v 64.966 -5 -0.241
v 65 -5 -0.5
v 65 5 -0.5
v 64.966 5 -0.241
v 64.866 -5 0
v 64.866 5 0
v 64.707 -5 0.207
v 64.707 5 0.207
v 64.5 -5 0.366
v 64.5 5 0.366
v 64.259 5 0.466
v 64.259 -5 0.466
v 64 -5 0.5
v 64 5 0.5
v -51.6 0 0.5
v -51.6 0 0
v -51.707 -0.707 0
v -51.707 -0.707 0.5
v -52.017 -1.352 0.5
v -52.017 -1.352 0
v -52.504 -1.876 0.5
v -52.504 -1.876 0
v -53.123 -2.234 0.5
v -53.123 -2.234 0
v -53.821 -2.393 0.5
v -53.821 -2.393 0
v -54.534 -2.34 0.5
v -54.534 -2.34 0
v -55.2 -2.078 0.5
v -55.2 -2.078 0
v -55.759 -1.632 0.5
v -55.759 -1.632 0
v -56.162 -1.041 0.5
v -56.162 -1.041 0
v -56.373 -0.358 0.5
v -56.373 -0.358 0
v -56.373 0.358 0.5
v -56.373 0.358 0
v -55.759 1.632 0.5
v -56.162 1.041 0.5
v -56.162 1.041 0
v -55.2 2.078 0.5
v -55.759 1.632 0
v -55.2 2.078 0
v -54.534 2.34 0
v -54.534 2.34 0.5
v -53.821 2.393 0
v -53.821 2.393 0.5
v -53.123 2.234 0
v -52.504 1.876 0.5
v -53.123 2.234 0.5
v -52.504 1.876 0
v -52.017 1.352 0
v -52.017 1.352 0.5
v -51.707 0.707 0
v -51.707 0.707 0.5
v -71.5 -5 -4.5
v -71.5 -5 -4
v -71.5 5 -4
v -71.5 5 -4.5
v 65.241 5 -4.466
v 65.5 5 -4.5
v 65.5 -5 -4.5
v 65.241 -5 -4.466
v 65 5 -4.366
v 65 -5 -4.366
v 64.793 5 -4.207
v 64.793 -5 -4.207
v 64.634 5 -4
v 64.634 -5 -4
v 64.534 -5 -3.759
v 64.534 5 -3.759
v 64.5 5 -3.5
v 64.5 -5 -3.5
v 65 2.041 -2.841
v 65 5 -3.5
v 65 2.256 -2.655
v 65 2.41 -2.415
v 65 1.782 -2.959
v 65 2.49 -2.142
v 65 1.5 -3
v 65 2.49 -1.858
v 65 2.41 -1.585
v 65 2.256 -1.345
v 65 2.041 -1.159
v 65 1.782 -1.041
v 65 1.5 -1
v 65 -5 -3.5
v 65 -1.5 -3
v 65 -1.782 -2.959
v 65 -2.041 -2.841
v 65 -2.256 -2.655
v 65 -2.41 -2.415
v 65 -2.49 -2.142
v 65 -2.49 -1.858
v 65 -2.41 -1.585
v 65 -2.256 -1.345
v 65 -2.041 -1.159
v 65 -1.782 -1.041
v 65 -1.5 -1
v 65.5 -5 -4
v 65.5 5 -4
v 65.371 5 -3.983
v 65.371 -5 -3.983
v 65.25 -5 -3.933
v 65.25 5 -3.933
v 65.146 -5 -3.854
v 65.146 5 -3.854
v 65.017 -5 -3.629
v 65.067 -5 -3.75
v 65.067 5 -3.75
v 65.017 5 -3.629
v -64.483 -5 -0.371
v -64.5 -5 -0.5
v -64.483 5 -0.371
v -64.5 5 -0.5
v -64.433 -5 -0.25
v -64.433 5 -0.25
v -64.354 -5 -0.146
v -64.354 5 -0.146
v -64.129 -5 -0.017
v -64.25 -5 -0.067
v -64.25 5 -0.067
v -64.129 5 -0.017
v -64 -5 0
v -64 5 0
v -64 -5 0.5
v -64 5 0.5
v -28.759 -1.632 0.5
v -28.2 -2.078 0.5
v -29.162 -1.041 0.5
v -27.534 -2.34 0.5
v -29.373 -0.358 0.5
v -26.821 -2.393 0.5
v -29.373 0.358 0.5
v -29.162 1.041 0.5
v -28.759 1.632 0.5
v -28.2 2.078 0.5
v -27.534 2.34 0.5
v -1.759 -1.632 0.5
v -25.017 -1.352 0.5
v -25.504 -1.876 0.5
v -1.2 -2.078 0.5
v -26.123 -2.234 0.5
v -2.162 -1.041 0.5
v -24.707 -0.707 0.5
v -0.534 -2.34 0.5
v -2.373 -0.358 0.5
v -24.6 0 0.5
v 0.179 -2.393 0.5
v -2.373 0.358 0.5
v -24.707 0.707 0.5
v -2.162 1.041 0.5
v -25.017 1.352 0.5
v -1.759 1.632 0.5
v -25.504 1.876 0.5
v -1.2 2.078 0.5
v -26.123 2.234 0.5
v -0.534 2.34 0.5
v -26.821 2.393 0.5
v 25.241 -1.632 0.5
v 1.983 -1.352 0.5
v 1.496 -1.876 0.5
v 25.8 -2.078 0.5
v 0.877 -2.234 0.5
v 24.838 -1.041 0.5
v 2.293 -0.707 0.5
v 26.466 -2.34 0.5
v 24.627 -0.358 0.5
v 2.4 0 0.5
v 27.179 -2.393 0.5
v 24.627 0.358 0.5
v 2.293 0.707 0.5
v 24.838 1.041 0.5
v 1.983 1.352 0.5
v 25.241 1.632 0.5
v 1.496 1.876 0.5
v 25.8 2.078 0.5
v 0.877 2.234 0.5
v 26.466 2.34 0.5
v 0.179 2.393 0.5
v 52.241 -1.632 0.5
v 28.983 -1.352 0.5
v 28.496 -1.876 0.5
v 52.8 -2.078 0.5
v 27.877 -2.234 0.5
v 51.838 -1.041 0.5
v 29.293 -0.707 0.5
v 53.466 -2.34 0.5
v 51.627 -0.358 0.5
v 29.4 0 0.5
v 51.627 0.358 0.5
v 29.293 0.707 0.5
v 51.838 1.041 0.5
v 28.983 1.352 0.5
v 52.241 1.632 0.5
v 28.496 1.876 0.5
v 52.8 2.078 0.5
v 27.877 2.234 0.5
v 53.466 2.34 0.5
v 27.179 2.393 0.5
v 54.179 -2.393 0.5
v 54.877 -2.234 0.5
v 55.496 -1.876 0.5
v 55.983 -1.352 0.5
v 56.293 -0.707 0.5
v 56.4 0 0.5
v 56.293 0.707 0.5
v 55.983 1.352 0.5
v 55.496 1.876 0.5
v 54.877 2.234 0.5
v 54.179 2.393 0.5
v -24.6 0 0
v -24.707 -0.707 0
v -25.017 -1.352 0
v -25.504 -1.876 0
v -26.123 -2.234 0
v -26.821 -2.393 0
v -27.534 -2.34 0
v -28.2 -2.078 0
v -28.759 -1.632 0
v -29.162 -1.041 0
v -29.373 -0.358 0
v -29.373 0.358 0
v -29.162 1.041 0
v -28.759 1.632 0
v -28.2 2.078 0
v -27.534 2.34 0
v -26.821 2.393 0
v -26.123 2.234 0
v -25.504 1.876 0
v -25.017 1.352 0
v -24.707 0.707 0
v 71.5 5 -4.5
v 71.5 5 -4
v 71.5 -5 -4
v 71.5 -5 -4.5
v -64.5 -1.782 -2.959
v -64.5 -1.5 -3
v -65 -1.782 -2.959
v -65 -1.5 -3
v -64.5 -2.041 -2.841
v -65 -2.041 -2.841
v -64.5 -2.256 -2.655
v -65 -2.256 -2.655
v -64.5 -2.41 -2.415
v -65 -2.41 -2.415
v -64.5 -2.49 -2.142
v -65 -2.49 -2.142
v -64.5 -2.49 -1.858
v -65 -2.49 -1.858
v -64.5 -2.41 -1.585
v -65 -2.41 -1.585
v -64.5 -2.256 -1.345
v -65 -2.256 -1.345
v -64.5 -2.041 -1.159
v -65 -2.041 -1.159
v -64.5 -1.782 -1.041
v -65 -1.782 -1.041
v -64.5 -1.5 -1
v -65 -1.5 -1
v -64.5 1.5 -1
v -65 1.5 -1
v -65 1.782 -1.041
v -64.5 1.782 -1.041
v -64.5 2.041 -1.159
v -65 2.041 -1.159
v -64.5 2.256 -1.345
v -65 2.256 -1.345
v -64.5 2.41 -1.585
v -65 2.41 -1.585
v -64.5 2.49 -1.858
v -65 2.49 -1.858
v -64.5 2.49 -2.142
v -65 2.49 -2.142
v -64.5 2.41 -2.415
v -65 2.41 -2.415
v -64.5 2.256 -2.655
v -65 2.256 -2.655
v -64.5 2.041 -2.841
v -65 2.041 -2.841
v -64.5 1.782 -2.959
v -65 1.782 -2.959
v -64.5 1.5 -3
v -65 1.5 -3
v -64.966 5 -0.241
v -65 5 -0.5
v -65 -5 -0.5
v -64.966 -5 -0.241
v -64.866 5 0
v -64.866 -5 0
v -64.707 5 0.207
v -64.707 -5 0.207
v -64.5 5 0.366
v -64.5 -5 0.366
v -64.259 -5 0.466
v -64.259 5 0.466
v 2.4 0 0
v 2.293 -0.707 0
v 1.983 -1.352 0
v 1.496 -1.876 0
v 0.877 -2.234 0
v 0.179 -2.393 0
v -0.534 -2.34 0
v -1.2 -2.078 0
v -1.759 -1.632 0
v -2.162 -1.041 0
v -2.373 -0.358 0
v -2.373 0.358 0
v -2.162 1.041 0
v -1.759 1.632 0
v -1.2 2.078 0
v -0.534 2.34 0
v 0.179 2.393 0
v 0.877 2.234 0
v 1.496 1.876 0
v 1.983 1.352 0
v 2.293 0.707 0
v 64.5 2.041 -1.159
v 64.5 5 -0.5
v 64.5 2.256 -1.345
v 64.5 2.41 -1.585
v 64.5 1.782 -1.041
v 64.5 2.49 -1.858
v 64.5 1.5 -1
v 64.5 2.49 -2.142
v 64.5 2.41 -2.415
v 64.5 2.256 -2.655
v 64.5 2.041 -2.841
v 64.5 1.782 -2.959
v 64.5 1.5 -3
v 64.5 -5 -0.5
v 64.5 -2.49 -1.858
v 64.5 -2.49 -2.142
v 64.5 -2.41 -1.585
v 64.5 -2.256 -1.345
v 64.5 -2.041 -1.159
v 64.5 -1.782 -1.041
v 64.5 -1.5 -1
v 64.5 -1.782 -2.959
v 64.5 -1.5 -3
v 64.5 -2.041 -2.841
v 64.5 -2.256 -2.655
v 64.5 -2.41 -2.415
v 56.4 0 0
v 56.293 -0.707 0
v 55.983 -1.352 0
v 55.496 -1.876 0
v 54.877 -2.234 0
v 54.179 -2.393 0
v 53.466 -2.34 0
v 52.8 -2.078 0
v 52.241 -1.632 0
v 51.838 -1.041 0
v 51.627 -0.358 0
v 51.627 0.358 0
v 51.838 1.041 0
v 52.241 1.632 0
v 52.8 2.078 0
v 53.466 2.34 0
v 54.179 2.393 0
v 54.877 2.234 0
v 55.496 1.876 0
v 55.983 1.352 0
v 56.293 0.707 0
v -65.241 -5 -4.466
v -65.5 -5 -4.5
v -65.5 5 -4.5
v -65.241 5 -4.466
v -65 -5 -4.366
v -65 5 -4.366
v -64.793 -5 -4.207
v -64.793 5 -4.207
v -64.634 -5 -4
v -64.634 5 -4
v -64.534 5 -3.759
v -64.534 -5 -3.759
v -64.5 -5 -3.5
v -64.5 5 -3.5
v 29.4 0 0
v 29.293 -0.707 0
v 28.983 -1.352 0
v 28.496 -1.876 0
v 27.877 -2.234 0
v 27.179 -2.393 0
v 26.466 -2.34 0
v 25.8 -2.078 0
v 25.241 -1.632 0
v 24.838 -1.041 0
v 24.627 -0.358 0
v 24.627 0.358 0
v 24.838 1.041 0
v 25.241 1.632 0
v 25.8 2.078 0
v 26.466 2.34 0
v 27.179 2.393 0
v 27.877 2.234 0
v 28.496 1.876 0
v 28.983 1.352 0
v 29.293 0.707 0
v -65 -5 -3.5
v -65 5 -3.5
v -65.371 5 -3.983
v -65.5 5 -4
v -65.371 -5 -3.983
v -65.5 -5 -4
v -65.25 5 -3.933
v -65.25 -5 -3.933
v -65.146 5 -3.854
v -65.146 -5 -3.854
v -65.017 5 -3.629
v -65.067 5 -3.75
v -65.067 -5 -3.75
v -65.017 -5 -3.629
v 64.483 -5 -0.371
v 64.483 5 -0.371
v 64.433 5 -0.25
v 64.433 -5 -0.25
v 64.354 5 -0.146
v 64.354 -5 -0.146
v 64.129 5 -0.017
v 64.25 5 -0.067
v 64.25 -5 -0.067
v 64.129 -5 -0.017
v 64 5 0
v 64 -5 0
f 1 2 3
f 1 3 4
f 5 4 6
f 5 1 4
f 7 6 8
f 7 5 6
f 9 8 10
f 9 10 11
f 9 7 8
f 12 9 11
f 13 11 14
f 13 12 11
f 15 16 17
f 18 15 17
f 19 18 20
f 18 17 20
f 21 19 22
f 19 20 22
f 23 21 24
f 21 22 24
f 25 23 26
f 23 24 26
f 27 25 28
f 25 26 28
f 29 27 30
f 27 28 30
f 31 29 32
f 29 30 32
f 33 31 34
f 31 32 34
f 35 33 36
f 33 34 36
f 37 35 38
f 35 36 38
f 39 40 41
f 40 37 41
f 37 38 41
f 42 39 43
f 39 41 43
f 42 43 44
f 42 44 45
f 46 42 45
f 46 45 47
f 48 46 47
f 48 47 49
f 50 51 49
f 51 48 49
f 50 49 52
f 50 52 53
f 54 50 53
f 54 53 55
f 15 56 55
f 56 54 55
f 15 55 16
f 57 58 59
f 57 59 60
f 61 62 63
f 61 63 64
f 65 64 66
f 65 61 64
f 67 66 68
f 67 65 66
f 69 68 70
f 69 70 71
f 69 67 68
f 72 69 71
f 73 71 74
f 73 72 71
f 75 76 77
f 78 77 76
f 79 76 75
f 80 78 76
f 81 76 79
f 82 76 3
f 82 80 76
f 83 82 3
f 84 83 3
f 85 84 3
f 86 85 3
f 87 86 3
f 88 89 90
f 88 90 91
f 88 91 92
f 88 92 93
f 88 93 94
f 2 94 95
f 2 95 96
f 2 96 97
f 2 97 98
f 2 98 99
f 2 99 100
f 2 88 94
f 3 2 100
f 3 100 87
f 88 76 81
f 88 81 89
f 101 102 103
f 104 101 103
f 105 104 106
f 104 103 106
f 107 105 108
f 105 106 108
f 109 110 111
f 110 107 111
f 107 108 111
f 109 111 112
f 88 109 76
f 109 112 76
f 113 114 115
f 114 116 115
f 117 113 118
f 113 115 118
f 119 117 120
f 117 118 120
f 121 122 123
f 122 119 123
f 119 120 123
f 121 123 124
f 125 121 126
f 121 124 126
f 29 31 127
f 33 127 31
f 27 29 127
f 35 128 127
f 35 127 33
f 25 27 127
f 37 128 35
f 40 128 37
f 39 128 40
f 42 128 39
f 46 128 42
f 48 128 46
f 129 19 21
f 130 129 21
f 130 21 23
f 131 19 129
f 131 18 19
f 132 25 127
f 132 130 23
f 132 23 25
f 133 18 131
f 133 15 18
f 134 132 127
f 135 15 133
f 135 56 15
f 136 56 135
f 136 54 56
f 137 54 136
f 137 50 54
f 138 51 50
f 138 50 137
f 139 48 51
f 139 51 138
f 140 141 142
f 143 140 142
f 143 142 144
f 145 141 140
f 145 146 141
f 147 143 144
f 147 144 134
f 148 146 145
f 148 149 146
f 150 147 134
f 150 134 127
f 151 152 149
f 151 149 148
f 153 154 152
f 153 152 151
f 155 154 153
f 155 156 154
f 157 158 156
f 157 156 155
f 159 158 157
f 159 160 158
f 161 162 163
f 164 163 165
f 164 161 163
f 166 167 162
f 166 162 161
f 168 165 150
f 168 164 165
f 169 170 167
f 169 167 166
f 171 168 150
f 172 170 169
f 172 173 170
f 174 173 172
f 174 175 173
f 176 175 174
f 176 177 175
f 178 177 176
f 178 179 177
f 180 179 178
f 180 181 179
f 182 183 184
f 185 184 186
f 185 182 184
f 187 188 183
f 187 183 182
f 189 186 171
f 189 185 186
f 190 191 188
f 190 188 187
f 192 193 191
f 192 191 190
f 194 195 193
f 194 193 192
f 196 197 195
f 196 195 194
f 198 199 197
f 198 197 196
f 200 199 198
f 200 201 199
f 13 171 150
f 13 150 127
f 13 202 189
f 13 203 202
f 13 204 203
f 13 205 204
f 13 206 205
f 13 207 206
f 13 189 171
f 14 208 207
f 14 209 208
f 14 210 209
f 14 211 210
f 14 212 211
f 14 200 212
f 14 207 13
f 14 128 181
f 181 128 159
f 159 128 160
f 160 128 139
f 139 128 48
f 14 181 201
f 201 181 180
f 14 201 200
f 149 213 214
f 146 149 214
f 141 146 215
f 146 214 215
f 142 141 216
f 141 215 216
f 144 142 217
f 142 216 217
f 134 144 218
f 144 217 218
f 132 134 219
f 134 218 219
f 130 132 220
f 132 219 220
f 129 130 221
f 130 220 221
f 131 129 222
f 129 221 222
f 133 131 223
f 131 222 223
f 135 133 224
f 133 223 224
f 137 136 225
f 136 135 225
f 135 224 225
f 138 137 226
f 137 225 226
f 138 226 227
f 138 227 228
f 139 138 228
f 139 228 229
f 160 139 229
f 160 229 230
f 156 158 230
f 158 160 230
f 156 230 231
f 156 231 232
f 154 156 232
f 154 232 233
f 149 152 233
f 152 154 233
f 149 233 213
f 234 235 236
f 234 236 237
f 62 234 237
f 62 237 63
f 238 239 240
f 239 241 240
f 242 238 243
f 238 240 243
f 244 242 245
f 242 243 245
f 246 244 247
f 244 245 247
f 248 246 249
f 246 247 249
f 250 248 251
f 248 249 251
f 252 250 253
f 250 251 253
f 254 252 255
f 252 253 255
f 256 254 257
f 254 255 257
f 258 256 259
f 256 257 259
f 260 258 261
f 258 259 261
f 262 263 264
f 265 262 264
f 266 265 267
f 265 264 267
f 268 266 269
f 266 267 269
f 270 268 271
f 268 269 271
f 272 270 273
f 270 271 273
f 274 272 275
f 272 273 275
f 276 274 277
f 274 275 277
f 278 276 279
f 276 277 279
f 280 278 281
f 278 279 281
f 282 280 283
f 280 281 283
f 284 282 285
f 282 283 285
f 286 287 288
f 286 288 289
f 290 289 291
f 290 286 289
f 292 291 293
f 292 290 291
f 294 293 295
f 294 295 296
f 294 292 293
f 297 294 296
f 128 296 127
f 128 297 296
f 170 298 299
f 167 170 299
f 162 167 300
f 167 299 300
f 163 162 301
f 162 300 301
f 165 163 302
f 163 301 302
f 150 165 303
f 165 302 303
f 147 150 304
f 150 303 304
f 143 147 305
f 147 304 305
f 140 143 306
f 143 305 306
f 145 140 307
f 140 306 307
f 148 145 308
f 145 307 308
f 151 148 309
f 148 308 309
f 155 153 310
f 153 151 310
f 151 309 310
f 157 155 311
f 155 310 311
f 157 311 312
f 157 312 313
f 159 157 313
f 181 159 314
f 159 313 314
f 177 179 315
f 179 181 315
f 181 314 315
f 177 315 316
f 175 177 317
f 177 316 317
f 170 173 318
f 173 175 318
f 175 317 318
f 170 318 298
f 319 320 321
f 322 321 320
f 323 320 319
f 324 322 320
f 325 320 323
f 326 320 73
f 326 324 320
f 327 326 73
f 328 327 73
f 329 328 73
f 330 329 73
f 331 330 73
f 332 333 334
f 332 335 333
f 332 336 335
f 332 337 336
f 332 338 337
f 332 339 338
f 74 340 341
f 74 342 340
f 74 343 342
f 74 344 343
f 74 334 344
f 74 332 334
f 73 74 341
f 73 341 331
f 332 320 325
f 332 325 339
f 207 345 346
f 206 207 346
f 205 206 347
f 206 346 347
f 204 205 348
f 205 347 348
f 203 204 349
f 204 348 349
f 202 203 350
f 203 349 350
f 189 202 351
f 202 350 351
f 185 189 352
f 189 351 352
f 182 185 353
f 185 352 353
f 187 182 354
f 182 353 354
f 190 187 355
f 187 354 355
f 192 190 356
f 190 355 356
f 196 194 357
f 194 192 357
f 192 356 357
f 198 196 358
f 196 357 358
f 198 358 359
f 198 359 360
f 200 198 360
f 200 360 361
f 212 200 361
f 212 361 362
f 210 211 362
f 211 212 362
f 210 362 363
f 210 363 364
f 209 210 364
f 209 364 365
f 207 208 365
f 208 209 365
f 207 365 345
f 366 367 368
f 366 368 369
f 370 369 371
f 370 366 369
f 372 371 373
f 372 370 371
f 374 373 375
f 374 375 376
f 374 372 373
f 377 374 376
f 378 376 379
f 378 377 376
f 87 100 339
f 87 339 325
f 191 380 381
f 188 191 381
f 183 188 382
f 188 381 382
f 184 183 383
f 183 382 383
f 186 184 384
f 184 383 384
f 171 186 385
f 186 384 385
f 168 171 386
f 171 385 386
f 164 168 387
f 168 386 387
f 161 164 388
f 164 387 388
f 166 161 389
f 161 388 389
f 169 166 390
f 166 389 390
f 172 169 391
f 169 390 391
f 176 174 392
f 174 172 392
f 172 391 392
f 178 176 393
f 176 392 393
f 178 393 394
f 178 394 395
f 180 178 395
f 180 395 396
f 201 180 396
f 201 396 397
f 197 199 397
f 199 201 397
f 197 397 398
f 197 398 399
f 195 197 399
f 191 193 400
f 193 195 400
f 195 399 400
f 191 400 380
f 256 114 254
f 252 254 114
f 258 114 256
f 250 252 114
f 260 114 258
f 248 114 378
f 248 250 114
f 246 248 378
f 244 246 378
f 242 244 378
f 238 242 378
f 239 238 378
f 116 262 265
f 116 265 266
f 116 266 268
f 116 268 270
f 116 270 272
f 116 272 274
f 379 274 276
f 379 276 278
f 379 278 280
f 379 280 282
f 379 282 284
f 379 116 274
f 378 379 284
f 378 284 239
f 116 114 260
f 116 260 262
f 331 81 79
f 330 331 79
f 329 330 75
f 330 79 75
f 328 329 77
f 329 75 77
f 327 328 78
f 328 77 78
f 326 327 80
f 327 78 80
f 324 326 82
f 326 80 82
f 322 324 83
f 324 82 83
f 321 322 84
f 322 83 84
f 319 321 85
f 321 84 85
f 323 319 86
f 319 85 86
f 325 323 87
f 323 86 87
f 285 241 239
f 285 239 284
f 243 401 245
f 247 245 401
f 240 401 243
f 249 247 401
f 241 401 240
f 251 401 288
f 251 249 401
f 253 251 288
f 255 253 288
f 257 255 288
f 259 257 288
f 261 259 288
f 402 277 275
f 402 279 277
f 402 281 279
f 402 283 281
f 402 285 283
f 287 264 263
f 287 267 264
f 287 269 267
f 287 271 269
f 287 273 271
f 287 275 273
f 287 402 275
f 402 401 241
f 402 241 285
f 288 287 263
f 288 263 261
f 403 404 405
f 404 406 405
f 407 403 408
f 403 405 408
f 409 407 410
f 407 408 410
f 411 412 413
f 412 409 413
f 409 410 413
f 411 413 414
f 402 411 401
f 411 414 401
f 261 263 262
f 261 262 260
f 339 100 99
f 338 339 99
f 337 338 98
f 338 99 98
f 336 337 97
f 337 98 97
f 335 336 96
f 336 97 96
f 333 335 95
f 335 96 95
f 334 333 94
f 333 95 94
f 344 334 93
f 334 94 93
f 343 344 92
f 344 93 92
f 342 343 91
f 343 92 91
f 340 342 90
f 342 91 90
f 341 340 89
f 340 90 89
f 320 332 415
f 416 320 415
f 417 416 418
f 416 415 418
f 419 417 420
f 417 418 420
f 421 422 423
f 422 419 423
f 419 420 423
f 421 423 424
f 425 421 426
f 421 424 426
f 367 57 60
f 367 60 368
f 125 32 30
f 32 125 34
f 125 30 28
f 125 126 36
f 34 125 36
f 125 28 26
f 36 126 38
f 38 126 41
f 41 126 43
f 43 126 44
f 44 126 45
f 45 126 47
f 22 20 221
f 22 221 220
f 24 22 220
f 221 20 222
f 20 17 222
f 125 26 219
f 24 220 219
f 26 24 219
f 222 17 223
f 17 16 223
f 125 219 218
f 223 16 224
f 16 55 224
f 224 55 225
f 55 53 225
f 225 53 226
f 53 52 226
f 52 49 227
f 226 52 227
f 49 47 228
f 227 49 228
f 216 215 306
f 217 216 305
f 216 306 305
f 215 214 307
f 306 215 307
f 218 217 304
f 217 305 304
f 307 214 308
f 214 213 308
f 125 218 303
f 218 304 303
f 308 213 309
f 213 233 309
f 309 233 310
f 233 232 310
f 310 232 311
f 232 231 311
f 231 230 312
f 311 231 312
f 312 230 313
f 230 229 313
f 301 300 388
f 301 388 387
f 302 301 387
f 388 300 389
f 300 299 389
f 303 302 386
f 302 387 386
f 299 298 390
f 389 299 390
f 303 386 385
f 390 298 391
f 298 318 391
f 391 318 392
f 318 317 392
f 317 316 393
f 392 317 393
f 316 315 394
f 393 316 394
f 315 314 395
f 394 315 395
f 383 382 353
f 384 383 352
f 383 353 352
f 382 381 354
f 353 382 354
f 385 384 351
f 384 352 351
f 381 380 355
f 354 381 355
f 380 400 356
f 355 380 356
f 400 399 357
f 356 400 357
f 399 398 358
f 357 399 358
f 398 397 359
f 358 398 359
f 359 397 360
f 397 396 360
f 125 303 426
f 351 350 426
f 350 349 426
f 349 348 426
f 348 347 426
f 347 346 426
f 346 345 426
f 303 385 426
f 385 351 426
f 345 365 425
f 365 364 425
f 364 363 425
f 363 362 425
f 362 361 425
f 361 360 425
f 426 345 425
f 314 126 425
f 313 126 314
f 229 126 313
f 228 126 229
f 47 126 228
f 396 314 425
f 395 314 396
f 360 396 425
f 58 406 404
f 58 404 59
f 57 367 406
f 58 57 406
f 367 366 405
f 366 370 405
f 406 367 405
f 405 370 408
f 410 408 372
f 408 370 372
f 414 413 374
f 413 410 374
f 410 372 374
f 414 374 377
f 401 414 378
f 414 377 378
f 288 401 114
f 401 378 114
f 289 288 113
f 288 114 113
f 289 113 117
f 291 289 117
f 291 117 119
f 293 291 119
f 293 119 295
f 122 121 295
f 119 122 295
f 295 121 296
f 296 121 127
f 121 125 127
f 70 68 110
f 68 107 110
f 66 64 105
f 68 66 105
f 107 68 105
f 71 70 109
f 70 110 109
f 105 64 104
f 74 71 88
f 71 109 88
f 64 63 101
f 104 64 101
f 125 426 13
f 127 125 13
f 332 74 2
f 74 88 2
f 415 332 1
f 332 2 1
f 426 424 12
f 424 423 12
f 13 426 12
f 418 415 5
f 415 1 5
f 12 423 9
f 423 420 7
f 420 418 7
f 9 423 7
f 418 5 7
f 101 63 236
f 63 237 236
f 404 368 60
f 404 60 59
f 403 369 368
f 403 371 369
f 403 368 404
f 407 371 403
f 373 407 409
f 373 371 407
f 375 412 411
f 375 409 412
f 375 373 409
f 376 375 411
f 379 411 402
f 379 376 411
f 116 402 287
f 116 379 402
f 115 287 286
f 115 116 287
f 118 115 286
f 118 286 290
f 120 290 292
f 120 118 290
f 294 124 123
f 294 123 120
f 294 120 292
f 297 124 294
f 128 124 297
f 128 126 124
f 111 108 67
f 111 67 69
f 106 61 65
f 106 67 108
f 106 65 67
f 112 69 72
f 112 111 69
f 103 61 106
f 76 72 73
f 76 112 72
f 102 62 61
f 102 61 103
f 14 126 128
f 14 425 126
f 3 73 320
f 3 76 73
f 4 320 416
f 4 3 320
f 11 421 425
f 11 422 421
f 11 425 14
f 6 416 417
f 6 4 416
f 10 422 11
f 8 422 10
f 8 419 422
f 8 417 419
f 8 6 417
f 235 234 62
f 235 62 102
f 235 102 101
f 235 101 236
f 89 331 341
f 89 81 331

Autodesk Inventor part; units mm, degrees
ref_plane "YZ Plane" through (0, 0, 0) normal (1, 0, 0) x (0, 1, 0)
ref_plane "XZ Plane" through (0, 0, 0) normal (0, 1, 0) x (-1, 0, 0)
ref_plane "XY Plane" through (0, 0, 0) normal (0, 0, 1) x (1, 0, 0)
sketch "Sketch1" plane through (0, 0, 0) normal (0, 0, 1) x (1, 0, 0)
  line L0 (-65, 5) -> (65, 5)
  line L1 (65, 5) -> (65, -5)
  line L2 (65, -5) -> (-65, -5)
  line L3 (-65, -5) -> (-65, 5)
  circle A0 centre (0, 0) radius 2.4
  circle A1 centre (-54, 0) radius 2.4
  circle A2 centre (-27, 0) radius 2.4
  circle A3 centre (27, 0) radius 2.4
  circle A4 centre (54, 0) radius 2.4
  line L4 (-65, 0) -> (65, 0) construction
  point P0 (0, 5)
  dimension "d0" = 130
  dimension "d1" = 10
  dimension "d2" = 4.8
  dimension "d3" = 4.8
  dimension "d4" = 4.8
  dimension "d5" = 4.8
  dimension "d6" = 4.8
  dimension "d9" = 27
  dimension "d10" = 27
  dimension "d11" = 27
  dimension "d12" = 27
extrude "Plate1" add sketch "Sketch1" along normal blind 0.5
sketch "Sketch2" plane through (64.5, -5, 0.5) normal (1, 0, 0) x (0, 1, 0)
  line L0 (10, 0) -> (0, 0)
  line L1 (0, 0) -> (0, -5)
  line L2 (0, -5) -> (10, -5)
  line L3 (10, -5) -> (10, 0)
edge flange "Flange1" height 5 angle 90 thickness 0.5 bend radius 0.5 thickness toward (1, 0, 0) relief tear relief width 0.5 relief depth 0.25 corner gap 0.5 corner form 0 edges at (65, 0, 0) (-65, 0, 0) wall of the first edge with corners at (64.5, 5, 0.5) (64.5, -5, 0.5) (64.5, -5, -4.5) (64.5, 5, -4.5)
bend "Bend1"
corner "Corner1"
sketch "Sketch3" plane through (64.5, 5, -4) normal (0, 0, -1) x (-1, 0, 0)
  line L0 (0, -10) -> (0, 0)
  line L1 (0, 0) -> (-7, 0)
  line L2 (-7, 0) -> (-7, -10)
  line L3 (-7, -10) -> (0, -10)
edge flange "Flange2" height 7 angle 90 thickness 0.5 bend radius 0.5 thickness toward (0, 0, -1) relief tear relief width 0.5 relief depth 0.25 corner gap 0.5 corner form 0 edges at (65, 0, -4.5) (-65, 0, -4.5) wall of the first edge with corners at (64.5, -5, -4) (64.5, 5, -4) (71.5, 5, -4) (71.5, -5, -4)
bend "Bend2"
corner "Corner2"
sketch "Sketch4" plane through (-65, -5, -0.5) normal (-1, 0, 0) x (0, 0, 1)
  line L0 (-3, 10) -> (-3, 0) projected
  line L1 (0, 0) -> (0, 10) projected
  line L2 (-3, 10) -> (0, 10) projected
  line L3 (-1.5, 3.5) -> (-1.5, 6.5) construction
  line L4 (-2.5, 3.5) -> (-2.5, 6.5)
  line L5 (-0.5, 6.5) -> (-0.5, 3.5)
  arc A0 (-2.5, 3.5) -> (-0.5, 3.5) centre (-1.5, 3.5) ccw
  arc A1 (-0.5, 6.5) -> (-2.5, 6.5) centre (-1.5, 6.5) ccw
  point P0 (0.5, 5)
  point P1 (-1.5, 5)
  point P2 (-0.5, 5)
  point P3 (0, 5)
  point P4 (-1.5, 7.5)
  point P5 (-1.5, 10)
  dimension "d34" = 2
  dimension "d35" = 5
extrude "Cut1" cut sketch "Sketch4" against normal blind 0.5
mirror "Mirror1" about plane through (0, 0, 0) normal (1, 0, 0) of "Cut1"
equation "\"d36\" = Thickness"
equation "\"d14\" = BendReliefWidth"
equation "\"d15\" = BendReliefDepth"
equation "\"d16\" = MinimumRemnant"
equation "\"d17\" = BendRadius"
equation "\"d20\" = BendRadius"
equation "\"d21\" = CornerReliefSize"
equation "\"d22\" = GapSize"
equation "\"d23\" = JacobiRadiusSize"
equation "\"d24\" = BendReliefWidth"
equation "\"d25\" = BendReliefDepth"
equation "\"d26\" = MinimumRemnant"
equation "\"d27\" = BendRadius"
equation "\"d30\" = BendRadius"
equation "\"d31\" = CornerReliefSize"
equation "\"d32\" = GapSize"
equation "\"d33\" = JacobiRadiusSize"
equation "\"BendRadius\" = Thickness"
equation "\"BendReliefWidth\" = Thickness"
equation "\"BendReliefDepth\" = 0.5 * Thickness"
equation "\"CornerReliefSize\" = 4 * Thickness"
equation "\"MinimumRemnant\" = 2 * Thickness"
equation "\"TransitionRadius\" = BendRadius"
equation "\"JacobiRadiusSize\" = BendRadius"
equation "\"GapSize\" = Thickness"
equation "\"kerf\" = 0.2"
equation "\"d13\" = BendRadius"
equation "\"Thickness\" = 0.5"
properties part number "LEDStripOrigami"
